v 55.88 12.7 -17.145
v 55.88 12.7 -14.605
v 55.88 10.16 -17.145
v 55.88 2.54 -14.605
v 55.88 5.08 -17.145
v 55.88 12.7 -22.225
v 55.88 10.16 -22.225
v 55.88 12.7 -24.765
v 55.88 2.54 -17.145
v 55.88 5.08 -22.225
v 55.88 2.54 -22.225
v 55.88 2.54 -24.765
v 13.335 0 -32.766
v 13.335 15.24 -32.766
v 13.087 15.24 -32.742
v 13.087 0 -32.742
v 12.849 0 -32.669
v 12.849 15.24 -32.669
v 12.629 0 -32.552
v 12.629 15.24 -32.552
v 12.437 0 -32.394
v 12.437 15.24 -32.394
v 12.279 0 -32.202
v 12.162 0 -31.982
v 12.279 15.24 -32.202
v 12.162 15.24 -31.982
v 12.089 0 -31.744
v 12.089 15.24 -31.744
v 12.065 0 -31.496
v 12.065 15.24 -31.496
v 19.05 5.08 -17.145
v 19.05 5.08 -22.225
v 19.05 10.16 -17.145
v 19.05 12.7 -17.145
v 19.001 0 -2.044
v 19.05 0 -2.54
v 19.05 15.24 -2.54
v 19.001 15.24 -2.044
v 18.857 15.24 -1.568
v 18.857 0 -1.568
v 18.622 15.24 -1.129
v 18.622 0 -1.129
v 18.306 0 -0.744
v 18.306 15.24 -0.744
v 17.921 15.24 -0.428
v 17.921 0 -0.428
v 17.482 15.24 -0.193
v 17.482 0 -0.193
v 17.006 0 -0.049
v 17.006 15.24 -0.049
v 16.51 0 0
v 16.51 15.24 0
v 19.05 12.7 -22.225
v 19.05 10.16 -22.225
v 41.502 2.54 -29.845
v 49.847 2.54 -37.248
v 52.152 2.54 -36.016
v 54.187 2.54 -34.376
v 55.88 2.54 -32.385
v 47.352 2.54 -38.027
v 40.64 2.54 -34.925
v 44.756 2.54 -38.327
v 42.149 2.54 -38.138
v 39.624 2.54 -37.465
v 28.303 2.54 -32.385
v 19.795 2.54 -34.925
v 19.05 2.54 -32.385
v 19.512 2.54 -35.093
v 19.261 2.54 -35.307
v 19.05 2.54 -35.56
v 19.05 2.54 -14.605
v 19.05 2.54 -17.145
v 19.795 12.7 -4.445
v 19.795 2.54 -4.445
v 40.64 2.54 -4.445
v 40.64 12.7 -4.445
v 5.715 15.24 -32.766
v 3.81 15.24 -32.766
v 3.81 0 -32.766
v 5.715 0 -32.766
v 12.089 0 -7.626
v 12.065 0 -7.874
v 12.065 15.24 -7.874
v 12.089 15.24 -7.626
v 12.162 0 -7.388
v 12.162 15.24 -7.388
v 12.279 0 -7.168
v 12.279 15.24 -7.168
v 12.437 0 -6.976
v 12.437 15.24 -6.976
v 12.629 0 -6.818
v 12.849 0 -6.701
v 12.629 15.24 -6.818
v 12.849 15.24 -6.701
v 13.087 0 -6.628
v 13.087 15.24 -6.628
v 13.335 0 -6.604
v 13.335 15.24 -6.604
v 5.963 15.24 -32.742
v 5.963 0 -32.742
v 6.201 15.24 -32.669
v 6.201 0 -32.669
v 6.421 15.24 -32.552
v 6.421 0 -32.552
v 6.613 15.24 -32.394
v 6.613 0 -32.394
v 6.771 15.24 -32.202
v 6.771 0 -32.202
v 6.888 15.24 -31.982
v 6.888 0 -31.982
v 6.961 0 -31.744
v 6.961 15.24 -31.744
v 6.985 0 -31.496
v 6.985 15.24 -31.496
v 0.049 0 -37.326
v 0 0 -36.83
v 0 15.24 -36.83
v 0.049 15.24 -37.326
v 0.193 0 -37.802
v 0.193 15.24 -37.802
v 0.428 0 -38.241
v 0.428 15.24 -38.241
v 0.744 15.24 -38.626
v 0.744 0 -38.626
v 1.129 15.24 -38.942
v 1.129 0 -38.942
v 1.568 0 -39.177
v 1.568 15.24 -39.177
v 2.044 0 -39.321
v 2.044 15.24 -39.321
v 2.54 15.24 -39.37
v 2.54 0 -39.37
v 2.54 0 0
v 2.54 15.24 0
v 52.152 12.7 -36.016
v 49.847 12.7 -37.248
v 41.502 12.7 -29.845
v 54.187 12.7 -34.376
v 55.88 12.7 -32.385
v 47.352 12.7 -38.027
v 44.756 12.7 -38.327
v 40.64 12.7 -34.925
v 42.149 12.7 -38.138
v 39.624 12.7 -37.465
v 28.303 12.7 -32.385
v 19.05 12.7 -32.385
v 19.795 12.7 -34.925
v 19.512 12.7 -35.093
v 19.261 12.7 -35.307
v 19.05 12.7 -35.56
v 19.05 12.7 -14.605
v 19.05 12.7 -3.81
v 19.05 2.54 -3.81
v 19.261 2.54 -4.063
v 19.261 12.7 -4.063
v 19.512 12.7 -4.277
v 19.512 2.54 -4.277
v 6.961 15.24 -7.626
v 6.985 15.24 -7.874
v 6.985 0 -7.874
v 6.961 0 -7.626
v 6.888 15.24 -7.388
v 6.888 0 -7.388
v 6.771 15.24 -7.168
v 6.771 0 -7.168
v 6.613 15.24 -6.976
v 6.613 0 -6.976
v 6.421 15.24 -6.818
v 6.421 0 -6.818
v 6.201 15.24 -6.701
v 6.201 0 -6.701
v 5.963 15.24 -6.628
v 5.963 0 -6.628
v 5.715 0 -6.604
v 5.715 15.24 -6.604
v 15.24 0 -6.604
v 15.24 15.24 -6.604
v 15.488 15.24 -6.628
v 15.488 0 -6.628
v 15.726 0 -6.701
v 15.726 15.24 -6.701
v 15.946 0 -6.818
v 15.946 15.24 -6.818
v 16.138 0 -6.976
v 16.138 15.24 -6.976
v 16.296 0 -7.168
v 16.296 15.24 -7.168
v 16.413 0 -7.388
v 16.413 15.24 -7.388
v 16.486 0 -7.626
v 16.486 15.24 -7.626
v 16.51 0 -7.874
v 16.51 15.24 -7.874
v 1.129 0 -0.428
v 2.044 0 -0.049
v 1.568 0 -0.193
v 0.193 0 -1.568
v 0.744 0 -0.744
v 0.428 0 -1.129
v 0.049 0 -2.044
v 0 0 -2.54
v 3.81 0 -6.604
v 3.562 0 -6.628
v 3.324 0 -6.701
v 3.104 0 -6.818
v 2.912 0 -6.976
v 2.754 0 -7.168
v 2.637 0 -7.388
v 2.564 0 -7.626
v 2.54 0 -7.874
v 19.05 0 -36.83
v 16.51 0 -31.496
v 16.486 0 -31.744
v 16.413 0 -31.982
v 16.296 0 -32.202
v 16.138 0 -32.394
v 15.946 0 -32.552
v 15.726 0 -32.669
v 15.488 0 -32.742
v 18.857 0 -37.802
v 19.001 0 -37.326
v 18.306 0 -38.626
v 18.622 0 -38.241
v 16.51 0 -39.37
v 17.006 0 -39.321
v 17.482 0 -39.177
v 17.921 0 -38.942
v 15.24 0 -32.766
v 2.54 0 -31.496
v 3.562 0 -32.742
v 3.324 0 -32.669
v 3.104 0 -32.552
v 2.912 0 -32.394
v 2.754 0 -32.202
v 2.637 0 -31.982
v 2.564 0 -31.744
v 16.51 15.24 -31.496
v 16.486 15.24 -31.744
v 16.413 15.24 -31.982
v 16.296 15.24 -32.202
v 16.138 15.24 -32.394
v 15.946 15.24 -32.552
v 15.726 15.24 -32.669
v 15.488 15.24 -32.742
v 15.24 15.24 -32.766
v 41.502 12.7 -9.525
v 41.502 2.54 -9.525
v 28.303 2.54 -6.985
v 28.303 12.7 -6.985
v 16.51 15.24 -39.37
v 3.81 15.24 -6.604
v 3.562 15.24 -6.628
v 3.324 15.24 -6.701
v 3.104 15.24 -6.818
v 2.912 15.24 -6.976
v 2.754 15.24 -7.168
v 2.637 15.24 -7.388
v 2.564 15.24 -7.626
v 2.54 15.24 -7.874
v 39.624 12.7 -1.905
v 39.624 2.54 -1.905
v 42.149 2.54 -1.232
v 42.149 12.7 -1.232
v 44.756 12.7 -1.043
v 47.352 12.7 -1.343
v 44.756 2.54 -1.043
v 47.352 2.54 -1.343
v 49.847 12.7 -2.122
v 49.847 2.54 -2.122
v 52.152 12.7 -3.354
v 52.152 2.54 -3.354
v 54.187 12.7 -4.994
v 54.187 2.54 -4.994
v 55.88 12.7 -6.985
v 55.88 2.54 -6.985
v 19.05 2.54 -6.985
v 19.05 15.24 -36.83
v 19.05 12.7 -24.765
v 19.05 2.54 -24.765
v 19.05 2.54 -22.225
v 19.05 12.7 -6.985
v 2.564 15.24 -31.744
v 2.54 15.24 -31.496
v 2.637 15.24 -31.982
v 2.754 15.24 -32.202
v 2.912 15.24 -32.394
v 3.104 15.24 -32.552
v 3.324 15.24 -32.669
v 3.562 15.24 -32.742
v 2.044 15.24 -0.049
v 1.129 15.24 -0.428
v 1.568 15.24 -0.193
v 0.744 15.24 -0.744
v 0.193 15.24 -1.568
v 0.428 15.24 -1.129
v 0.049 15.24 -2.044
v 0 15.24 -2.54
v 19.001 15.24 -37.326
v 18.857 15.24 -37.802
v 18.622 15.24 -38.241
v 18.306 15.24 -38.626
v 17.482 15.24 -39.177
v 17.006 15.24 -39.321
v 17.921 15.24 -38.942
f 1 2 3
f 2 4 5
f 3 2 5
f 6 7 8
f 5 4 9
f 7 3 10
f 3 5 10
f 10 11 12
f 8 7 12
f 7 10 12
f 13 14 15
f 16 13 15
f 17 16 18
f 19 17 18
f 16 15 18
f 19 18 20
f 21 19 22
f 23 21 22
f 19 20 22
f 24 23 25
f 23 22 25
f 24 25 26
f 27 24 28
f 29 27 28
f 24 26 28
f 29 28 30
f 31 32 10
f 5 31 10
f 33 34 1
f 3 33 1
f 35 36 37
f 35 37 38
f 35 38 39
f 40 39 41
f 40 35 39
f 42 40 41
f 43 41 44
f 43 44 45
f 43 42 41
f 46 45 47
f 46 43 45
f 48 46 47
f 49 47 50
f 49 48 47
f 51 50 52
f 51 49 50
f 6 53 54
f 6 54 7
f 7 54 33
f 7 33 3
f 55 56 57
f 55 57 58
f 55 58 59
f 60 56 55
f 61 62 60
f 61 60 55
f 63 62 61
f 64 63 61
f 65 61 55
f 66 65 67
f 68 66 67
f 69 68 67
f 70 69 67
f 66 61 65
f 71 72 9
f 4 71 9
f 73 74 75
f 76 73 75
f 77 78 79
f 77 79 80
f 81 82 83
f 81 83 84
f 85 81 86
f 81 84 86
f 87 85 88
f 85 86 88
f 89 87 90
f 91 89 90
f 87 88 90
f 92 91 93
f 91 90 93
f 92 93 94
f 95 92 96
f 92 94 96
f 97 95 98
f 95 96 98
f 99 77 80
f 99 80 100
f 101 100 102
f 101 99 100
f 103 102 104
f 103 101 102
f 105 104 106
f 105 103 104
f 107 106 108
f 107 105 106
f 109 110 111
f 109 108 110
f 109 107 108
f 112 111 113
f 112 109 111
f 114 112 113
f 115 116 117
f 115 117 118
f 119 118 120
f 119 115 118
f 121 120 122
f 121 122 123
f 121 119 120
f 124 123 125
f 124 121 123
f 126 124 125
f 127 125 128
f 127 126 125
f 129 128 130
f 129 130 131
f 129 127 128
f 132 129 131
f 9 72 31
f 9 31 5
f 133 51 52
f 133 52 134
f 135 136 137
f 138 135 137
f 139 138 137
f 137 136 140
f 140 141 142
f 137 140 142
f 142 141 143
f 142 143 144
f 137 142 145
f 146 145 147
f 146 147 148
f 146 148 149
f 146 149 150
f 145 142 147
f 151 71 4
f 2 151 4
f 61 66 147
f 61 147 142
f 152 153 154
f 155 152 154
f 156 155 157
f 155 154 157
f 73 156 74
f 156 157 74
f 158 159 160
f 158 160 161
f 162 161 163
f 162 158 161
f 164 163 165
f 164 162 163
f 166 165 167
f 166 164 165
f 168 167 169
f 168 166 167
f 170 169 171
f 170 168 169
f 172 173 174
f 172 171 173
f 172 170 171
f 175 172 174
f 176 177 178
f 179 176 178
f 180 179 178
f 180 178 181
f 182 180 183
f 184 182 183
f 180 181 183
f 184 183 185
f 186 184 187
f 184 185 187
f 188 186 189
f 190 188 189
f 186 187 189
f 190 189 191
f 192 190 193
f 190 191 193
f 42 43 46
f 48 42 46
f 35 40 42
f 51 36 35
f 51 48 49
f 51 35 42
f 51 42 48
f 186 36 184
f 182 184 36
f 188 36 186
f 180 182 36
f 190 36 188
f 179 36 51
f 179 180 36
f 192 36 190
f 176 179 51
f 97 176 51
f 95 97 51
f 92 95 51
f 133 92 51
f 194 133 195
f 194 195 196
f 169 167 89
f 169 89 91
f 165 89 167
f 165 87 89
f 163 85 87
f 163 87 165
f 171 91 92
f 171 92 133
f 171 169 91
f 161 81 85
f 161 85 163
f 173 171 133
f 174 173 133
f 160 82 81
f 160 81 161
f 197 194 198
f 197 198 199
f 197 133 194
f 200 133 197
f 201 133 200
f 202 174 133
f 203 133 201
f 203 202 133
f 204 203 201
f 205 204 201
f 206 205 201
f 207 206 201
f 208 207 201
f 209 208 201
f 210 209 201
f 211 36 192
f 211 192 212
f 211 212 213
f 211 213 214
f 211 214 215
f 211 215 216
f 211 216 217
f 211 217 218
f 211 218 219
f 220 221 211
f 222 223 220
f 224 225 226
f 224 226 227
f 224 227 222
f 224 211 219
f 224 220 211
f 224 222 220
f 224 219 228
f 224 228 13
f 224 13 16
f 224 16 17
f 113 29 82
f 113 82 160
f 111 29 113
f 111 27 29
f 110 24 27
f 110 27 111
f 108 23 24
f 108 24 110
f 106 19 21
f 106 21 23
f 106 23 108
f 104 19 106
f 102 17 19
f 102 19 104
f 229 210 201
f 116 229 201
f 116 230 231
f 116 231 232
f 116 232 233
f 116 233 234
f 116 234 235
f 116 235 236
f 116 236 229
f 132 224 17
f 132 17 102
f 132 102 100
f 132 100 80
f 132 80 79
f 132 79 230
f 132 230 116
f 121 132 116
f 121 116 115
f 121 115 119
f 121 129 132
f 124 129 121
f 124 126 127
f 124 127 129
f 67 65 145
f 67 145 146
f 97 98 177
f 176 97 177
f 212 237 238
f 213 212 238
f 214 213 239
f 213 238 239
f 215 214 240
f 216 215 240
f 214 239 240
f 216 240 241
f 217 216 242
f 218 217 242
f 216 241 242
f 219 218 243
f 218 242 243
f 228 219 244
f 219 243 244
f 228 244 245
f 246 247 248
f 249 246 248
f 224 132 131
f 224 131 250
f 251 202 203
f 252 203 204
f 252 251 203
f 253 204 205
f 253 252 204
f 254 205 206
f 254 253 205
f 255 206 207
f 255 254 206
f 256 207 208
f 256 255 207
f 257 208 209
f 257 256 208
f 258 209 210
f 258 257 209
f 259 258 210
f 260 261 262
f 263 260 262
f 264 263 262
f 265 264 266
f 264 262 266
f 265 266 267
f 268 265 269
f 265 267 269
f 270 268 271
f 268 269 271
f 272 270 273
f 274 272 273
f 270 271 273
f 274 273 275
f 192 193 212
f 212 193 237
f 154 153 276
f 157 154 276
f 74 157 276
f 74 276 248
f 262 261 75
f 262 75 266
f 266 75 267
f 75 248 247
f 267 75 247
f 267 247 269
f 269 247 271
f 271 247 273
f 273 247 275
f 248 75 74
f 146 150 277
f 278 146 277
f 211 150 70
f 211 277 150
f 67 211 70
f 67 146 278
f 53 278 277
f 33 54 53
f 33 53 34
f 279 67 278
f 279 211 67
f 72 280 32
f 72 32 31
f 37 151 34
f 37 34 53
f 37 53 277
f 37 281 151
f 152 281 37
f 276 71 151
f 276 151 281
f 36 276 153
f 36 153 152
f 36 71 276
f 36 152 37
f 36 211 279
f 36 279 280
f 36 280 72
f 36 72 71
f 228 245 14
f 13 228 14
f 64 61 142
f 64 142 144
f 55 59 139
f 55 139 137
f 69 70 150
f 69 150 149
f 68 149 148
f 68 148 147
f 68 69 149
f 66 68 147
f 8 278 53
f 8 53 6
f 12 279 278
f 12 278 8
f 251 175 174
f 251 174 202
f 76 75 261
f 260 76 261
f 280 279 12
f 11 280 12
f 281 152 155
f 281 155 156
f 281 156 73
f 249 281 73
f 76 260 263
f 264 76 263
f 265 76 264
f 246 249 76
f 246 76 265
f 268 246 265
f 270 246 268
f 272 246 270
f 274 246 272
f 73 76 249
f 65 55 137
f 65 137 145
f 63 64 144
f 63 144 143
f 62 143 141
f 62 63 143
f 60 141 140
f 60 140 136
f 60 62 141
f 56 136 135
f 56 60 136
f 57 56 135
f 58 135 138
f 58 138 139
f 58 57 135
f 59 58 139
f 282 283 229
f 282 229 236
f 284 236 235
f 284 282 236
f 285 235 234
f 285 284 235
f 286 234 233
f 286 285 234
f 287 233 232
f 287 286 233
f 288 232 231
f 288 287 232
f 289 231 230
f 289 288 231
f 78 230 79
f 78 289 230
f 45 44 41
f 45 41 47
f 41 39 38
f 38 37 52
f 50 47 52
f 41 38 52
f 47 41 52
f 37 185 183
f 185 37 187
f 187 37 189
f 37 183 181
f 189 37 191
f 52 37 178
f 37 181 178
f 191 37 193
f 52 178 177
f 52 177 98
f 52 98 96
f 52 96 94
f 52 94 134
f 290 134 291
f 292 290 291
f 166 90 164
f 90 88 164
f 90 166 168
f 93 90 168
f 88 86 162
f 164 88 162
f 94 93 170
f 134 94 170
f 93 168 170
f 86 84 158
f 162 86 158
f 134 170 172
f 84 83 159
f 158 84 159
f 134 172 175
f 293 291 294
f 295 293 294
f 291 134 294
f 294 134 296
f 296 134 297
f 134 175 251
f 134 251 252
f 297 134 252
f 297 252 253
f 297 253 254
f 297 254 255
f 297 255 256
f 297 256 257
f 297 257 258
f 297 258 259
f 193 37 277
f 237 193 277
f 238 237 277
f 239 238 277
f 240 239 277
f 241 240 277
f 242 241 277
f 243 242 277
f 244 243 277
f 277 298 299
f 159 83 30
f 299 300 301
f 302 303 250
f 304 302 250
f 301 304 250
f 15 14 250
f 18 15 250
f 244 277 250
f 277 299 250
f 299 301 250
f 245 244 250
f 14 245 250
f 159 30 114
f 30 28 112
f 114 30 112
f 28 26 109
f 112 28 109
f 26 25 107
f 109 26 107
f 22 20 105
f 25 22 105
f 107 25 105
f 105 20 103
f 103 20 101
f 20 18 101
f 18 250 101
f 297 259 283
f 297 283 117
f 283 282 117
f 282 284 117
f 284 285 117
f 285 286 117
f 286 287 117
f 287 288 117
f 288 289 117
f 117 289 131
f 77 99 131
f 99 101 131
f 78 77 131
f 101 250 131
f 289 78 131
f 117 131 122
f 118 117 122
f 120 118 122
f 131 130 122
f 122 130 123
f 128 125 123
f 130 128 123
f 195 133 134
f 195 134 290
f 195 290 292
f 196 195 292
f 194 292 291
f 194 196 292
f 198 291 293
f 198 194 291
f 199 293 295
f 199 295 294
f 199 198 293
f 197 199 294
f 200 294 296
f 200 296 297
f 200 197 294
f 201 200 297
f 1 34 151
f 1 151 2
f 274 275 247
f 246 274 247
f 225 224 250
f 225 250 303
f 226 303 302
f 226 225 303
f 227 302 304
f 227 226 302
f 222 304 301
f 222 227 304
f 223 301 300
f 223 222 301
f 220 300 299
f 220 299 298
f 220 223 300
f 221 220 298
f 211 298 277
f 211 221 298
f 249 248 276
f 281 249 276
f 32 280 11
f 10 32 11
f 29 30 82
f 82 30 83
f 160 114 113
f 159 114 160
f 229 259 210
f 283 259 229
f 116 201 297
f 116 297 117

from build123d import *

# Parameters (mm, degrees)
BOSS_EXTRUDE1_DEPTH = 15.24
CUT_EXTRUDE1_DEPTH  = 47.315839623
SKETCH5_W           = 36.83
SKETCH5_H           = 10.16
BOSS_EXTRUDE2_DEPTH = 10.16
SKETCH7_W           = 36.83
SKETCH7_H           = 5.08
CUT_EXTRUDE2_DEPTH  = 2.54


with BuildPart() as part:
    # Sketch1 → Boss-Extrude1 (new body)
    with BuildSketch(Plane(origin=(0, 0, 0), x_dir=(1, 0, 0), z_dir=(0, 1, 0))):
        with BuildLine():
            Line((19.05, 36.83), (19.05, 2.54))
            ThreePointArc((19.05, 2.54), (18.306051224, 0.743948776), (16.51, 0))
            Line((16.51, 0), (2.54, 0))
            ThreePointArc((2.54, 0), (0.743948776, 0.743948776), (0, 2.54))
            Line((0, 2.54), (0, 36.83))
            ThreePointArc((0, 36.83), (0.743948776, 38.626051224), (2.54, 39.37))
            Line((2.54, 39.37), (16.51, 39.37))
            ThreePointArc((16.51, 39.37), (18.306051224, 38.626051224), (19.05, 36.83))
        make_face()
    extrude(amount=BOSS_EXTRUDE1_DEPTH)

    # Sketch3 → Cut-Extrude1 (cut, through all)
    with BuildSketch(Plane(origin=(0, 15.24, 0), x_dir=(1, 0, 0), z_dir=(0, 1, 0))):
        with BuildLine():
            Line((6.985, 31.496), (6.985, 7.874))
            ThreePointArc((6.985, 7.874), (6.613025612, 6.975974388), (5.715, 6.604))
            Line((5.715, 6.604), (3.81, 6.604))
            ThreePointArc((3.81, 6.604), (2.911974388, 6.975974388), (2.54, 7.874))
            Line((2.54, 7.874), (2.54, 31.496))
            ThreePointArc((2.54, 31.496), (2.911974388, 32.394025612), (3.81, 32.766))
            Line((3.81, 32.766), (5.715, 32.766))
            ThreePointArc((5.715, 32.766), (6.613025612, 32.394025612), (6.985, 31.496))
        make_face()
        with BuildLine():
            Line((12.065, 31.496), (12.065, 7.874))
            ThreePointArc((12.065, 7.874), (12.436974388, 6.975974388), (13.335, 6.604))
            Line((13.335, 6.604), (15.24, 6.604))
            ThreePointArc((15.24, 6.604), (16.138025612, 6.975974388), (16.51, 7.874))
            Line((16.51, 7.874), (16.51, 31.496))
            ThreePointArc((16.51, 31.496), (16.138025612, 32.394025612), (15.24, 32.766))
            Line((15.24, 32.766), (13.335, 32.766))
            ThreePointArc((13.335, 32.766), (12.436974388, 32.394025612), (12.065, 31.496))
        make_face()
    extrude(amount=-CUT_EXTRUDE1_DEPTH, mode=Mode.SUBTRACT)

    # Sketch5 → Boss-Extrude2 (add)
    with BuildSketch(Plane(origin=(0, 2.54, 0), x_dir=(1, 0, 0), z_dir=(0, 1, 0))):
        with BuildLine():
            Line((19.795155373, 34.925), (40.64, 34.925))
            Line((40.64, 34.925), (39.624, 37.465))
            ThreePointArc((39.624, 37.465), (48.617910258, 37.695912826), (55.88, 32.385))
            Line((55.88, 32.385), (41.501589711, 29.845))
            Line((41.501589711, 29.845), (28.302846613, 32.385))
            Line((28.302846613, 32.385), (19.338620701, 32.385))
            Line((19.338620701, 32.385), (19.05, 32.385))
            Line((19.05, 32.385), (19.05, 35.56))
            ThreePointArc((19.05, 35.56), (19.381676592, 35.194503669), (19.795155373, 34.925))
        make_face()
        with Locations((37.465, 19.685)):
            Rectangle(SKETCH5_W, SKETCH5_H)
        with BuildLine():
            Line((19.795155373, 4.445), (40.64, 4.445))
            Line((40.64, 4.445), (39.624, 1.905))
            ThreePointArc((39.624, 1.905), (48.617910258, 1.674087174), (55.88, 6.985))
            Line((55.88, 6.985), (41.501589711, 9.525))
            Line((41.501589711, 9.525), (28.302846613, 6.985))
            Line((28.302846613, 6.985), (19.338620701, 6.985))
            Line((19.338620701, 6.985), (19.05, 6.985))
            Line((19.05, 6.985), (19.05, 3.81))
            ThreePointArc((19.05, 3.81), (19.381676592, 4.175496331), (19.795155373, 4.445))
        make_face()
    extrude(amount=BOSS_EXTRUDE2_DEPTH)

    # Sketch7 → Cut-Extrude2 (cut)
    with BuildSketch(Plane(origin=(0, 12.7, 0), x_dir=(1, 0, 0), z_dir=(0, 1, 0))):
        with Locations((37.465, 19.685)):
            Rectangle(SKETCH7_W, SKETCH7_H)
    cut_extrude2 = extrude(amount=-CUT_EXTRUDE2_DEPTH, mode=Mode.SUBTRACT)

    # Mirror1: Cut-Extrude2 across plane
    add(cut_extrude2.mirror(Plane.ZX.offset(7.62)), mode=Mode.SUBTRACT)


solid = part.part
